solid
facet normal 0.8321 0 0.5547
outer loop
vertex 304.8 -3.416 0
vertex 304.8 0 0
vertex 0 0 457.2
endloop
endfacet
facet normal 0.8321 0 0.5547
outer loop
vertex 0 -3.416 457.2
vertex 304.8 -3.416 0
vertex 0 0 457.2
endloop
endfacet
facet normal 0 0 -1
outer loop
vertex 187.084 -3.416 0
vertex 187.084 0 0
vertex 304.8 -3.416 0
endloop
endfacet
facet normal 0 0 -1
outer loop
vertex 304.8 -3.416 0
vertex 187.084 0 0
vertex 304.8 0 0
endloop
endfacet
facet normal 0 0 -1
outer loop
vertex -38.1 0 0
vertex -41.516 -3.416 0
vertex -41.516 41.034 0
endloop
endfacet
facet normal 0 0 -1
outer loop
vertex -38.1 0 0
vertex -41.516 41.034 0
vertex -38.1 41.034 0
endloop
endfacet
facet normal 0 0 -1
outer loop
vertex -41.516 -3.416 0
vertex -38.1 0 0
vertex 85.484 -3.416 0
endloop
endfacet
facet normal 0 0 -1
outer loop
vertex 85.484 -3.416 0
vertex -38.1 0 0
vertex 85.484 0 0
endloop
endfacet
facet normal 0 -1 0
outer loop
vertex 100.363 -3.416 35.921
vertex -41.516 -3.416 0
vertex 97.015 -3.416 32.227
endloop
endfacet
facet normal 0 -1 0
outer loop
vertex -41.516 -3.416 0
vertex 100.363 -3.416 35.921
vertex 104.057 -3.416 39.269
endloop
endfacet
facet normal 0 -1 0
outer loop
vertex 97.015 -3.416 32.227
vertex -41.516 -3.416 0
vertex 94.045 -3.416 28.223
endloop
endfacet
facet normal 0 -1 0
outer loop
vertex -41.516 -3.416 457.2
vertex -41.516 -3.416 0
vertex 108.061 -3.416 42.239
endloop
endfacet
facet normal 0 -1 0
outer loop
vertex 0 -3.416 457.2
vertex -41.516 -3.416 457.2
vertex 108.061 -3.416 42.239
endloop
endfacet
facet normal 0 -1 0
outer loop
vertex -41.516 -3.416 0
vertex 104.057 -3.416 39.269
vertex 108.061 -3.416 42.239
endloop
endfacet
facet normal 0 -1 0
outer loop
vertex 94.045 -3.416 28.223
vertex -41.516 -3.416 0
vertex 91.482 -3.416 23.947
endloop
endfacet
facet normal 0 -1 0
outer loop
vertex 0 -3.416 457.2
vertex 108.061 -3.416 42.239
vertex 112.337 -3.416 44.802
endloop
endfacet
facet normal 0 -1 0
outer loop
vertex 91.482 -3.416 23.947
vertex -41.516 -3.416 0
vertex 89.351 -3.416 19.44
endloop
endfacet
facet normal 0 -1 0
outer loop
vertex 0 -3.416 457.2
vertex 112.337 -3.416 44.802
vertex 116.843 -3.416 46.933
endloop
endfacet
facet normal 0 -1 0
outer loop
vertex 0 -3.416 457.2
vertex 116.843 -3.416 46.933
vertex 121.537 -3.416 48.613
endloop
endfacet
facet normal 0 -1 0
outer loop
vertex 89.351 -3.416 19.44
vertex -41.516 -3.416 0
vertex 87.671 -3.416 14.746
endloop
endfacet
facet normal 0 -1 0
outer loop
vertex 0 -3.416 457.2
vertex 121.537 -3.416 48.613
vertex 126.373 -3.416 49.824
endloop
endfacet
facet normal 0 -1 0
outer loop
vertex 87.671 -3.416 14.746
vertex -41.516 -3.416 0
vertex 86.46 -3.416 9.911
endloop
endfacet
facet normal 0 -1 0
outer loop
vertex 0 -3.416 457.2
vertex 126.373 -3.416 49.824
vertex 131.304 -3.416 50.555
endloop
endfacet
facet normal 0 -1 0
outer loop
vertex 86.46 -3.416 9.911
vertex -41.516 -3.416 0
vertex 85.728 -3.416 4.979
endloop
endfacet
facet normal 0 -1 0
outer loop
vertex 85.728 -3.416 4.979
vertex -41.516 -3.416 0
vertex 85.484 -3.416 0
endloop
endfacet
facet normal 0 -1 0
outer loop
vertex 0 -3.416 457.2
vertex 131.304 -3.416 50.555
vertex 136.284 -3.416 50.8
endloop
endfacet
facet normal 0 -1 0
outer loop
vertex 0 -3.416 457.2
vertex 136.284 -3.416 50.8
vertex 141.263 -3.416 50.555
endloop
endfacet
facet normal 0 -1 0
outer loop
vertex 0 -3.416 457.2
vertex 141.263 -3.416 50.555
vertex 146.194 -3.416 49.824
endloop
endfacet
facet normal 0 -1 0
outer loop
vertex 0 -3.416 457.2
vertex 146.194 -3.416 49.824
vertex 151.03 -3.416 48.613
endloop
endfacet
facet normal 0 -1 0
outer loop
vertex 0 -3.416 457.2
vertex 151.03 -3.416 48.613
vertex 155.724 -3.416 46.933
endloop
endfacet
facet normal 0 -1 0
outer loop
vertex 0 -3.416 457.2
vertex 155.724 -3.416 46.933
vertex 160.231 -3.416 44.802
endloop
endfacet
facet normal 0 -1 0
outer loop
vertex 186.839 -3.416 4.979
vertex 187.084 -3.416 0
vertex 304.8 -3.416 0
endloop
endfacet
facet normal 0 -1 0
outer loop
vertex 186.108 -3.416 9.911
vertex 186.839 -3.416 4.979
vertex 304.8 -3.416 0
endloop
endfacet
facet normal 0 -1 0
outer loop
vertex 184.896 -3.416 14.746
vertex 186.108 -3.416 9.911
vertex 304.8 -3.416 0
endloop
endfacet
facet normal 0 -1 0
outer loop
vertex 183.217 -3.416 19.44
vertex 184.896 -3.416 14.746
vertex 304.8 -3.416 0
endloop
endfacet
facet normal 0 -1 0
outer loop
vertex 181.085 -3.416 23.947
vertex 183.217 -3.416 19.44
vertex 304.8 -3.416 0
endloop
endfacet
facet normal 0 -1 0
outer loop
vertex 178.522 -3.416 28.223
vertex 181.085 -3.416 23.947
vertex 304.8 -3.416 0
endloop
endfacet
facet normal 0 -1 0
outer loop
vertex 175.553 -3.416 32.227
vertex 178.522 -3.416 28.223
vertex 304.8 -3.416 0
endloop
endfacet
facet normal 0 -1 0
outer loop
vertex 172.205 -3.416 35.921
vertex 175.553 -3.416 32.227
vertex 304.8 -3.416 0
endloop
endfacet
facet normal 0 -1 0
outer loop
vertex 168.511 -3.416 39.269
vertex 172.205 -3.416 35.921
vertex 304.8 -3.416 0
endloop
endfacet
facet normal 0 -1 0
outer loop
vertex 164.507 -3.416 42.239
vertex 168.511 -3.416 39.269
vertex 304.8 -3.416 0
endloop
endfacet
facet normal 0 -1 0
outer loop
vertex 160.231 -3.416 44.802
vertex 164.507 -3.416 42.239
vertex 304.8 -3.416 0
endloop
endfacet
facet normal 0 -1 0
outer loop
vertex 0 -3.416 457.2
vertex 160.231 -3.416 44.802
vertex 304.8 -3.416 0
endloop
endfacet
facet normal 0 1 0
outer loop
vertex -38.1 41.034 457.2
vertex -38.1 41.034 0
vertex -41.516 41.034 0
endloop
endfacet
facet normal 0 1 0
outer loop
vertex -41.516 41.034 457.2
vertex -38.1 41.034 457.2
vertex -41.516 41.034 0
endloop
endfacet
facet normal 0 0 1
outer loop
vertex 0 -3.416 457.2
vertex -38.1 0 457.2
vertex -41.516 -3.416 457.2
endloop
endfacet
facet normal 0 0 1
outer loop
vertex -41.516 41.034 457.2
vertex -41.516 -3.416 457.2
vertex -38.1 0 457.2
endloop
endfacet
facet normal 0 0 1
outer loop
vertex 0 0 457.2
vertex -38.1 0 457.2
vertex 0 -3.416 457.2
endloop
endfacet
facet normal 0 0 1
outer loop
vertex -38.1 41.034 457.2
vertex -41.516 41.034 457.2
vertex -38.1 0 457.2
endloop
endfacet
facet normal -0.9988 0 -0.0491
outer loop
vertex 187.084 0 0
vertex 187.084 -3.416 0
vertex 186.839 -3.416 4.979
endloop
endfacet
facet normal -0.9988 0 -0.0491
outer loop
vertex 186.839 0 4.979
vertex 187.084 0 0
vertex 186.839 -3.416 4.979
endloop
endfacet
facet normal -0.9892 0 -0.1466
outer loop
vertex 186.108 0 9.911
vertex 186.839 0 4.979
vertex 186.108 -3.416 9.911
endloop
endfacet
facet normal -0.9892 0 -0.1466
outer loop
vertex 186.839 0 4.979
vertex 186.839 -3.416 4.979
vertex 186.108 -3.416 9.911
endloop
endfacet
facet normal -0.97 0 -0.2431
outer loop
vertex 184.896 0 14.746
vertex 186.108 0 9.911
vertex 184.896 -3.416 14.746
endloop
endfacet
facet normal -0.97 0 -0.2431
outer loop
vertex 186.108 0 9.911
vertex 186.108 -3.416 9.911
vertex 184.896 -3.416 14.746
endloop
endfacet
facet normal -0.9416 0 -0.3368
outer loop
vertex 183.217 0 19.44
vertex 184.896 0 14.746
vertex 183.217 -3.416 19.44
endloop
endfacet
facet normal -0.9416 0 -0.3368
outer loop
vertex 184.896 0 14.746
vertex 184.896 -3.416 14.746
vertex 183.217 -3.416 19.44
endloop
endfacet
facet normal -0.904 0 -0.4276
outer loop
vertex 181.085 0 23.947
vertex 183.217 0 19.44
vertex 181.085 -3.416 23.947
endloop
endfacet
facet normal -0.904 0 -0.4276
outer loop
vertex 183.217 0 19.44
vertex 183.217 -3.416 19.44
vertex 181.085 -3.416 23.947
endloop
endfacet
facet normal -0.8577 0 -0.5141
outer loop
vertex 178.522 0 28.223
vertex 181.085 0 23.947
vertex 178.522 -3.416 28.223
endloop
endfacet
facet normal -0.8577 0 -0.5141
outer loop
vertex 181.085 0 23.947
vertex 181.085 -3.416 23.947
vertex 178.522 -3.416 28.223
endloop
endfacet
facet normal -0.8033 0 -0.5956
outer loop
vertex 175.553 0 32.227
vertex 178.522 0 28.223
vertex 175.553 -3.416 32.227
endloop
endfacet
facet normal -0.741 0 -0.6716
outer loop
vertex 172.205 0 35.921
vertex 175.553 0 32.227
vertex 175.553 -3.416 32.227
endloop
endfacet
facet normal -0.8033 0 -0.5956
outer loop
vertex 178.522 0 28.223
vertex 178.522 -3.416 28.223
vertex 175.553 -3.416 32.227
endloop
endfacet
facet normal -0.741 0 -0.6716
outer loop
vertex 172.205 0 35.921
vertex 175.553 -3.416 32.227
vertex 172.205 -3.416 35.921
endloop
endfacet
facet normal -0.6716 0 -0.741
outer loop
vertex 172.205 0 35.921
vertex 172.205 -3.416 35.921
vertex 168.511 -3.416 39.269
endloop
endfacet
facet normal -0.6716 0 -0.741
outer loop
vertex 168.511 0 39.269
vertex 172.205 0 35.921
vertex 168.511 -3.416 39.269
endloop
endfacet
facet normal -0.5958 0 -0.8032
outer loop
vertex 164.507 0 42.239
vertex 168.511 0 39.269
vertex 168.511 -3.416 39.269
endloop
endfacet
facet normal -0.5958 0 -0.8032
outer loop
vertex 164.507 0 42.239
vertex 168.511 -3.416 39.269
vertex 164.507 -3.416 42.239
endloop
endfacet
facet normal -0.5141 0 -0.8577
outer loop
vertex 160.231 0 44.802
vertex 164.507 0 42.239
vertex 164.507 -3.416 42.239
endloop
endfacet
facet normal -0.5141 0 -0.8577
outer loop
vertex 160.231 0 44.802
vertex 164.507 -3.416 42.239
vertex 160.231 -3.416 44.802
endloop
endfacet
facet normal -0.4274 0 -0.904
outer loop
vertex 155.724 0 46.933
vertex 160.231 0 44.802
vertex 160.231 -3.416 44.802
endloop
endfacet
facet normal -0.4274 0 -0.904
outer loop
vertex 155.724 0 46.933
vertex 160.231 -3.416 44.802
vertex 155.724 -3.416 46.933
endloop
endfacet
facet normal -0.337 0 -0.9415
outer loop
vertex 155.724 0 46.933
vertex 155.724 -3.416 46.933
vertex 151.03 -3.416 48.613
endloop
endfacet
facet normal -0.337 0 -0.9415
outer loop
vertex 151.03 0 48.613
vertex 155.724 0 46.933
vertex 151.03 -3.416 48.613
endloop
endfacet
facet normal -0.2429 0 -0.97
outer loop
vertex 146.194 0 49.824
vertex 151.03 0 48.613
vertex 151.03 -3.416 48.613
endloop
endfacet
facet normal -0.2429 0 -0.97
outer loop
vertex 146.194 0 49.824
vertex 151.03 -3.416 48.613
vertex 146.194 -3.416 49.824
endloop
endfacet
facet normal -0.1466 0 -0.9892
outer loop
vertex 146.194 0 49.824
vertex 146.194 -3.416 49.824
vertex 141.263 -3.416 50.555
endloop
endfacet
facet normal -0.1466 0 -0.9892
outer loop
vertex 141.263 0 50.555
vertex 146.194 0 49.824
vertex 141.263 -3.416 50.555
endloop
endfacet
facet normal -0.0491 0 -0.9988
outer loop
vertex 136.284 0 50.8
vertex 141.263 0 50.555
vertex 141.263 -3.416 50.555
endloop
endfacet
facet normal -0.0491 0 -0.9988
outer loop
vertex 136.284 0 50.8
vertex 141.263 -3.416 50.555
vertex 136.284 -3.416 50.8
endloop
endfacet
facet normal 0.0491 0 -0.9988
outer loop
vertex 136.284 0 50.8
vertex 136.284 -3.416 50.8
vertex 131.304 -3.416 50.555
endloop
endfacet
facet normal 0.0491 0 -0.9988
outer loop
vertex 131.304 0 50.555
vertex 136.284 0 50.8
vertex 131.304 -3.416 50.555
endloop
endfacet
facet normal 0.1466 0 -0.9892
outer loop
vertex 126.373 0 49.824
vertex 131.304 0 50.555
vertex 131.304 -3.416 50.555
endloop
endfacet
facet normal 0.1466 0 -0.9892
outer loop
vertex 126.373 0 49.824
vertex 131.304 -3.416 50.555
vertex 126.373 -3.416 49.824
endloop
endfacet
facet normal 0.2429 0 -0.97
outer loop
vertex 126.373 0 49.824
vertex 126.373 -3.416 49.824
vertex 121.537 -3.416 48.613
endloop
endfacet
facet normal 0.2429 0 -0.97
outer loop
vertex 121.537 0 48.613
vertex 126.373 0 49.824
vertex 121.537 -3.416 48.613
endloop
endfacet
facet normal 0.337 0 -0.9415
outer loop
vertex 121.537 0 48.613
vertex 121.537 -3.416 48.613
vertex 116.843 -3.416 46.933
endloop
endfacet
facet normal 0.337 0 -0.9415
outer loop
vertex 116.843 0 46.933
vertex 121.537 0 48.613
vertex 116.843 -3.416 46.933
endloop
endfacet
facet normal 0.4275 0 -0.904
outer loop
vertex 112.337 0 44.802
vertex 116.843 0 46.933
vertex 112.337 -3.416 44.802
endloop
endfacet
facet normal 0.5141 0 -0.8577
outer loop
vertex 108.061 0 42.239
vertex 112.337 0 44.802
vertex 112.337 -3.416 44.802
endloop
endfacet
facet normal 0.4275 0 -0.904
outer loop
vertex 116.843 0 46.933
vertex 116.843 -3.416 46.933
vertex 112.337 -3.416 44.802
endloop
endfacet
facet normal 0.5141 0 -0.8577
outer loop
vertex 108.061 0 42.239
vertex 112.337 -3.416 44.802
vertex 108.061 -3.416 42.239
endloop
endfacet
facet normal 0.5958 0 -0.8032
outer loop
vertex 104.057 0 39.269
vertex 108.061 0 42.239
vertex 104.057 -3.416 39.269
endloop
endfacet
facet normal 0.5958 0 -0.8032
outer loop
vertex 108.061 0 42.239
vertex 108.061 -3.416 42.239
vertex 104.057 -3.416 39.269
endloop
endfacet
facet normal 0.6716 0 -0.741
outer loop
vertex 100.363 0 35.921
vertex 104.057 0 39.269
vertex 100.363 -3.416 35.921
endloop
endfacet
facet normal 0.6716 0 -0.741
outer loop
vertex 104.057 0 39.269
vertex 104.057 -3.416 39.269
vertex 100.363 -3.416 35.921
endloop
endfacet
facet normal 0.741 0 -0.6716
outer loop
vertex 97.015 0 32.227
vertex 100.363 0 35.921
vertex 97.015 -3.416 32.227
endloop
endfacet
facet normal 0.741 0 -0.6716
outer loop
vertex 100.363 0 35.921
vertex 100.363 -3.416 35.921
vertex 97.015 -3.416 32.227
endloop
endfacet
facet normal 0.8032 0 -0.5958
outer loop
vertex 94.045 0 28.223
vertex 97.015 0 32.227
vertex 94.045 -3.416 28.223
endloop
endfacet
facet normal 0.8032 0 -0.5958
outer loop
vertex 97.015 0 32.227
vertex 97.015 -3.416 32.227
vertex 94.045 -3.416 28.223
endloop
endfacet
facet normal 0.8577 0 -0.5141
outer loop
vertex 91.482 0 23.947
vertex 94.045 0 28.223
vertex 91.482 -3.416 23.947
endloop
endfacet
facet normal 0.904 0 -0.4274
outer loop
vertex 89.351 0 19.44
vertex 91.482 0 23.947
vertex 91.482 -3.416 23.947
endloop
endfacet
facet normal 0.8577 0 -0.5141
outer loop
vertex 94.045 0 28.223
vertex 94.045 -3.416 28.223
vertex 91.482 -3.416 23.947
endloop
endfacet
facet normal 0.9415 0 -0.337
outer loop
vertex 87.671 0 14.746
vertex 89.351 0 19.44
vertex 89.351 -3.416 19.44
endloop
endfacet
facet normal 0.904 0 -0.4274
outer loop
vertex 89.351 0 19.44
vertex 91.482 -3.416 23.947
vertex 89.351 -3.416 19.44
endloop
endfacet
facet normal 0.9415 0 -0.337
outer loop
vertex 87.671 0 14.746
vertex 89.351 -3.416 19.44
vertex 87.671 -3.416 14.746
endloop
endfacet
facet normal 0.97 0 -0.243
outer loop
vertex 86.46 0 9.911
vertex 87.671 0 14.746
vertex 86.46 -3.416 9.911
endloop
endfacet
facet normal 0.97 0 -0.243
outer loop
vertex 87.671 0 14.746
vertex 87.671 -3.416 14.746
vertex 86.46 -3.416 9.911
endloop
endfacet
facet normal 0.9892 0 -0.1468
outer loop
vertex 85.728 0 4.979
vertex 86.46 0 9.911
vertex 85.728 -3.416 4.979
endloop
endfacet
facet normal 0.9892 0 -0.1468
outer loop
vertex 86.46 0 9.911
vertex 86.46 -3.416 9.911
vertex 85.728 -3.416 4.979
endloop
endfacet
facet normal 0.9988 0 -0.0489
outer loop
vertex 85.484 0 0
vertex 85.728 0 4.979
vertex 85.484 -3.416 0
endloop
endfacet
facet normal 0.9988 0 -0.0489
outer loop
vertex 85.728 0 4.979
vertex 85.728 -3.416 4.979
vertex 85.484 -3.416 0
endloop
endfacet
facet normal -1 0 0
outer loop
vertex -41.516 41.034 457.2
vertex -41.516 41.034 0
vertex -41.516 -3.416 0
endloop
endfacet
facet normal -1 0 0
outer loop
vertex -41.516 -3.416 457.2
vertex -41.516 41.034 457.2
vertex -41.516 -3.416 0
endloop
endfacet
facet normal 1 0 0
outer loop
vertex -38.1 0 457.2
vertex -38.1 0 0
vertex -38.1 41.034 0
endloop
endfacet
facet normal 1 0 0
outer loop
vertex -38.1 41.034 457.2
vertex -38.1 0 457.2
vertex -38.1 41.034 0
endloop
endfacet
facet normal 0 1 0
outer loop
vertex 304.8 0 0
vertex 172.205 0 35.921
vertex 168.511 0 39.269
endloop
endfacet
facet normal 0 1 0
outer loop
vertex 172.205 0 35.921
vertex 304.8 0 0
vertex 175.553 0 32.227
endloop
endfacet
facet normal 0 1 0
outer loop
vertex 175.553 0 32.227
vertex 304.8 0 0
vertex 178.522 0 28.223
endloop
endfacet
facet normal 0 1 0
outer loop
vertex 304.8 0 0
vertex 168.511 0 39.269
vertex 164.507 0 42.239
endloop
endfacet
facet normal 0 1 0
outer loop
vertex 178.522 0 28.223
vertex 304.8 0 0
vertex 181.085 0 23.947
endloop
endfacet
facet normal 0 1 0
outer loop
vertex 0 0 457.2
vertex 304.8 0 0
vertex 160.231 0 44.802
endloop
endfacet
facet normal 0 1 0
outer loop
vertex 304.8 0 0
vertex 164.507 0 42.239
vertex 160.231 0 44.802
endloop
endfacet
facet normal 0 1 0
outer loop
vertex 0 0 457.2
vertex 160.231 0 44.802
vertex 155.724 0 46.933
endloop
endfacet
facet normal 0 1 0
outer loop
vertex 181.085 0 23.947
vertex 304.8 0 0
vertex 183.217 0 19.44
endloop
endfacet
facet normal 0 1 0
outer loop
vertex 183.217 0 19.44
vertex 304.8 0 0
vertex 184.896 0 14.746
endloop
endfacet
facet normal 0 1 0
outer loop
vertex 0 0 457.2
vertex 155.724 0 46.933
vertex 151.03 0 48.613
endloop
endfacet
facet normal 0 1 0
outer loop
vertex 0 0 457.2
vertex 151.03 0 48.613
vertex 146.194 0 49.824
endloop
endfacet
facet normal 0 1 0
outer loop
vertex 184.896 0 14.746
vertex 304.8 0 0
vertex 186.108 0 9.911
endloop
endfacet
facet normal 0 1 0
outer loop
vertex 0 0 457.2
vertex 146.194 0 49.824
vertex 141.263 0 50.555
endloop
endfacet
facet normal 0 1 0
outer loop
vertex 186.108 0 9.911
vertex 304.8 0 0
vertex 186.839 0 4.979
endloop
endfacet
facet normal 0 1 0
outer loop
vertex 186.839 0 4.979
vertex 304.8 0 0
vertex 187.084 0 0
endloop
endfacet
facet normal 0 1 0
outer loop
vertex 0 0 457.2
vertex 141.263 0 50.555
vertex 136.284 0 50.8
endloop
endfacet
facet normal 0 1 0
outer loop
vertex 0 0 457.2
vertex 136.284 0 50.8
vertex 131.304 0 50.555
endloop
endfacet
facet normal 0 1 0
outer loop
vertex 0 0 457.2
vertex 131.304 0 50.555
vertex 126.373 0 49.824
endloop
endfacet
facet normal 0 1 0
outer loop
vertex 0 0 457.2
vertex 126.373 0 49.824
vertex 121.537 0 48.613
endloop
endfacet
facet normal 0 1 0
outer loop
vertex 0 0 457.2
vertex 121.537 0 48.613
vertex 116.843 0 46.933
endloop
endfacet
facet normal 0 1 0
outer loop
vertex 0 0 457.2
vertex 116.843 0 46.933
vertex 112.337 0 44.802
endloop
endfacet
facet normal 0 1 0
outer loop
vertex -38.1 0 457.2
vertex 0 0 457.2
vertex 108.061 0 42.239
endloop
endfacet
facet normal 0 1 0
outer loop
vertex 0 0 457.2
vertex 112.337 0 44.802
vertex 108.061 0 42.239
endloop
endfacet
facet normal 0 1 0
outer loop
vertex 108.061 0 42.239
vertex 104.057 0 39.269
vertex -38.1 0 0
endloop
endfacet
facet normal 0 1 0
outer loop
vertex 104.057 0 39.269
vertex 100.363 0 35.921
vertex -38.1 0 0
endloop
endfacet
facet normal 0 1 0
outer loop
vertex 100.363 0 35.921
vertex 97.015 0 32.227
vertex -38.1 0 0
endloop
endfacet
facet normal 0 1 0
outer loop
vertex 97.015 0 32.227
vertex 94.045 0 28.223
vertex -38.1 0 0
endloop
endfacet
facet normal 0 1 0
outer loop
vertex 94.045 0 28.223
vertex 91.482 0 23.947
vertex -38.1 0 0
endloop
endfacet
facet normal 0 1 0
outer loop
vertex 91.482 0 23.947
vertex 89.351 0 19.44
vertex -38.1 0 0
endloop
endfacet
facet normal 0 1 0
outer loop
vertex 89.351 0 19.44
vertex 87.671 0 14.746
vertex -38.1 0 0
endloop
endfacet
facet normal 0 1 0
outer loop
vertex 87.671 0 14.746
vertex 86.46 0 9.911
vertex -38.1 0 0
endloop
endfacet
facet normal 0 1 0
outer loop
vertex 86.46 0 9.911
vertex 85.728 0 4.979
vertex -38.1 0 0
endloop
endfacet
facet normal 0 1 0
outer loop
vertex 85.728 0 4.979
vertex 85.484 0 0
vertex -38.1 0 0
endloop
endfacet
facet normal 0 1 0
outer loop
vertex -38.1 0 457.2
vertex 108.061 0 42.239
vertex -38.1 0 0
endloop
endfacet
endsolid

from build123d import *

# Parameters (mm, degrees)
F1_DEPTH = 3.4163
F3_DEPTH = 457.2
F4_R     = 50.8
F5_DEPTH = 25.4


with BuildPart() as f1:
    # F0 (on Front) → F1 (new body)
    with BuildSketch(Plane.XZ):
        Polygon((0, 457.2), (0, 0), (304.8, 0), align=None)
    extrude(amount=F1_DEPTH)

    # F2 (on Top) → F3 (join, through all)
    with BuildSketch(Plane.XY):
        Polygon((0, -3.4163), (0, 0), (-38.1, 0), (-38.1, 41.0337), (-41.5163, 41.0337), (-41.5163, -3.4163), align=None)
    extrude(amount=F3_DEPTH)

    # F4 (on face) → F5 (cut)
    with BuildSketch(Plane.XZ.offset(3.4163)):
        with Locations((136.2837, 0)):
            Circle(F4_R)
    extrude(amount=-F5_DEPTH, mode=Mode.SUBTRACT)


solid = f1.part
